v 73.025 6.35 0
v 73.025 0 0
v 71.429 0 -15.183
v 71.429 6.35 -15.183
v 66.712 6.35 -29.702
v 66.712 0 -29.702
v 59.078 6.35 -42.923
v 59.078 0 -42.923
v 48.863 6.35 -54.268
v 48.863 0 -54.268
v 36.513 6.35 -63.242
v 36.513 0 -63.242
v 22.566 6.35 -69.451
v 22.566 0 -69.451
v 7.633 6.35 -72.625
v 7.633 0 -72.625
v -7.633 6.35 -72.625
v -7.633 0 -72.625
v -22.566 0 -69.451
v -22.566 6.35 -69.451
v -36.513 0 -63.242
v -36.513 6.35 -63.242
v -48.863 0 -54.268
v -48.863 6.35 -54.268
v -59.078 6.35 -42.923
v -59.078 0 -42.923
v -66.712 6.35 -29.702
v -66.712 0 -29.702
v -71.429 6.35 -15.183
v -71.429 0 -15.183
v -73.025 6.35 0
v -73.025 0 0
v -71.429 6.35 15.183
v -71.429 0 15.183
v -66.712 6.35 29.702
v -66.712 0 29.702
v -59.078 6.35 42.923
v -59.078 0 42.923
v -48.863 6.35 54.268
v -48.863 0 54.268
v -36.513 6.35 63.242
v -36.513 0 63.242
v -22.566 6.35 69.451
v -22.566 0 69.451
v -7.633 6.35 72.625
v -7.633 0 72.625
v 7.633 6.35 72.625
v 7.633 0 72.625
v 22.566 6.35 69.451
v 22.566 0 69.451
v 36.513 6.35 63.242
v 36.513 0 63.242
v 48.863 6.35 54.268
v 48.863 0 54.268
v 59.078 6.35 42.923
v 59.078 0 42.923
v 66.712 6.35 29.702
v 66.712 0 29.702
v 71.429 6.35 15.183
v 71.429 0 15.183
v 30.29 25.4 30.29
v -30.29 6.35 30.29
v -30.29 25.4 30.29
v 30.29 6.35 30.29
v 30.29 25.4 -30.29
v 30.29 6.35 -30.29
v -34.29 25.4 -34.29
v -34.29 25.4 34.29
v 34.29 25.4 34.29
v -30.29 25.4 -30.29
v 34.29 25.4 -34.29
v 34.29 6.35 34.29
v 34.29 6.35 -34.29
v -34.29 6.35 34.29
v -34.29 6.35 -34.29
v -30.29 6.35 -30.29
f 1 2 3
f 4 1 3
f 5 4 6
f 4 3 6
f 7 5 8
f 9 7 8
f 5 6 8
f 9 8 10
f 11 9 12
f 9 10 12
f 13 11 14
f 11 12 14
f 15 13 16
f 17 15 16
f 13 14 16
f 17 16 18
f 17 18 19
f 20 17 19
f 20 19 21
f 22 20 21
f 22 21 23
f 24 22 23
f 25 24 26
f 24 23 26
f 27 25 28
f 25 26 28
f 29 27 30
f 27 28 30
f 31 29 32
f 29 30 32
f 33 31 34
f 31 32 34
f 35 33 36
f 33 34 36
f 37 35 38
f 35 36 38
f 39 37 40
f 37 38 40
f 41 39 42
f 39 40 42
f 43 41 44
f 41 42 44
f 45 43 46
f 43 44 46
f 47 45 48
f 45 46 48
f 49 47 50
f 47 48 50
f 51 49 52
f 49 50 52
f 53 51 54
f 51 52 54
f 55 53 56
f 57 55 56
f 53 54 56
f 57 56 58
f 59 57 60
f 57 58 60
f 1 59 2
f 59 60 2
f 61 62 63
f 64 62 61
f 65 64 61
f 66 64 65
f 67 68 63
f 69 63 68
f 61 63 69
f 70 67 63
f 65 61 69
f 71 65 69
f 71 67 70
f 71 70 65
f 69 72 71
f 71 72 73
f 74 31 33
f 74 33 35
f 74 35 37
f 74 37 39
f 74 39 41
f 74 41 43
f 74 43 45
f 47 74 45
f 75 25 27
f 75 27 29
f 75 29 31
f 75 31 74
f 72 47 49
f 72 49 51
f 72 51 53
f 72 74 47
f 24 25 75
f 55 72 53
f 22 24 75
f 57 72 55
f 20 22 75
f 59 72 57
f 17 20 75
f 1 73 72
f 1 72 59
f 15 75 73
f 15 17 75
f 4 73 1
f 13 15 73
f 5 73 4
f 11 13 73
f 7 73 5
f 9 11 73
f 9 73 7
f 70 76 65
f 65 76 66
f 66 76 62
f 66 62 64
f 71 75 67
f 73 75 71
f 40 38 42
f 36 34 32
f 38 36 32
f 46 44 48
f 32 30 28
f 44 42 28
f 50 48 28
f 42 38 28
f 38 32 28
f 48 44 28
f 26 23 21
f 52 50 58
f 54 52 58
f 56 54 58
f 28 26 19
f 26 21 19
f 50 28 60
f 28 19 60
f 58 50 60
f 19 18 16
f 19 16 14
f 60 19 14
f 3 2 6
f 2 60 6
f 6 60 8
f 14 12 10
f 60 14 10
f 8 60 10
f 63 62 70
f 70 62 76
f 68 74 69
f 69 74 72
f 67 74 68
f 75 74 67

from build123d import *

# Parameters (mm, degrees)
SKETCH1_W           = 68.58
SKETCH1_H           = 68.58
SKETCH1_W_2         = 60.58
SKETCH1_H_2         = 60.58
BOSS_EXTRUDE1_DEPTH = 25.4
SKETCH2_R           = 73.025
BOSS_EXTRUDE2_DEPTH = 6.35


with BuildPart() as part:
    # Sketch1 → Boss-Extrude1 (new body)
    with BuildSketch(Plane(origin=(0, 0, 0), x_dir=(1, 0, 0), z_dir=(0, 1, 0))):
        Rectangle(SKETCH1_W, SKETCH1_H)
        Rectangle(SKETCH1_W_2, SKETCH1_H_2, mode=Mode.SUBTRACT)
    extrude(amount=BOSS_EXTRUDE1_DEPTH)

    # Sketch2 → Boss-Extrude2 (add)
    with BuildSketch(Plane(origin=(0, 0, 0), x_dir=(1, 0, 0), z_dir=(0, 1, 0))):
        Circle(SKETCH2_R)
    extrude(amount=BOSS_EXTRUDE2_DEPTH)


solid = part.part
